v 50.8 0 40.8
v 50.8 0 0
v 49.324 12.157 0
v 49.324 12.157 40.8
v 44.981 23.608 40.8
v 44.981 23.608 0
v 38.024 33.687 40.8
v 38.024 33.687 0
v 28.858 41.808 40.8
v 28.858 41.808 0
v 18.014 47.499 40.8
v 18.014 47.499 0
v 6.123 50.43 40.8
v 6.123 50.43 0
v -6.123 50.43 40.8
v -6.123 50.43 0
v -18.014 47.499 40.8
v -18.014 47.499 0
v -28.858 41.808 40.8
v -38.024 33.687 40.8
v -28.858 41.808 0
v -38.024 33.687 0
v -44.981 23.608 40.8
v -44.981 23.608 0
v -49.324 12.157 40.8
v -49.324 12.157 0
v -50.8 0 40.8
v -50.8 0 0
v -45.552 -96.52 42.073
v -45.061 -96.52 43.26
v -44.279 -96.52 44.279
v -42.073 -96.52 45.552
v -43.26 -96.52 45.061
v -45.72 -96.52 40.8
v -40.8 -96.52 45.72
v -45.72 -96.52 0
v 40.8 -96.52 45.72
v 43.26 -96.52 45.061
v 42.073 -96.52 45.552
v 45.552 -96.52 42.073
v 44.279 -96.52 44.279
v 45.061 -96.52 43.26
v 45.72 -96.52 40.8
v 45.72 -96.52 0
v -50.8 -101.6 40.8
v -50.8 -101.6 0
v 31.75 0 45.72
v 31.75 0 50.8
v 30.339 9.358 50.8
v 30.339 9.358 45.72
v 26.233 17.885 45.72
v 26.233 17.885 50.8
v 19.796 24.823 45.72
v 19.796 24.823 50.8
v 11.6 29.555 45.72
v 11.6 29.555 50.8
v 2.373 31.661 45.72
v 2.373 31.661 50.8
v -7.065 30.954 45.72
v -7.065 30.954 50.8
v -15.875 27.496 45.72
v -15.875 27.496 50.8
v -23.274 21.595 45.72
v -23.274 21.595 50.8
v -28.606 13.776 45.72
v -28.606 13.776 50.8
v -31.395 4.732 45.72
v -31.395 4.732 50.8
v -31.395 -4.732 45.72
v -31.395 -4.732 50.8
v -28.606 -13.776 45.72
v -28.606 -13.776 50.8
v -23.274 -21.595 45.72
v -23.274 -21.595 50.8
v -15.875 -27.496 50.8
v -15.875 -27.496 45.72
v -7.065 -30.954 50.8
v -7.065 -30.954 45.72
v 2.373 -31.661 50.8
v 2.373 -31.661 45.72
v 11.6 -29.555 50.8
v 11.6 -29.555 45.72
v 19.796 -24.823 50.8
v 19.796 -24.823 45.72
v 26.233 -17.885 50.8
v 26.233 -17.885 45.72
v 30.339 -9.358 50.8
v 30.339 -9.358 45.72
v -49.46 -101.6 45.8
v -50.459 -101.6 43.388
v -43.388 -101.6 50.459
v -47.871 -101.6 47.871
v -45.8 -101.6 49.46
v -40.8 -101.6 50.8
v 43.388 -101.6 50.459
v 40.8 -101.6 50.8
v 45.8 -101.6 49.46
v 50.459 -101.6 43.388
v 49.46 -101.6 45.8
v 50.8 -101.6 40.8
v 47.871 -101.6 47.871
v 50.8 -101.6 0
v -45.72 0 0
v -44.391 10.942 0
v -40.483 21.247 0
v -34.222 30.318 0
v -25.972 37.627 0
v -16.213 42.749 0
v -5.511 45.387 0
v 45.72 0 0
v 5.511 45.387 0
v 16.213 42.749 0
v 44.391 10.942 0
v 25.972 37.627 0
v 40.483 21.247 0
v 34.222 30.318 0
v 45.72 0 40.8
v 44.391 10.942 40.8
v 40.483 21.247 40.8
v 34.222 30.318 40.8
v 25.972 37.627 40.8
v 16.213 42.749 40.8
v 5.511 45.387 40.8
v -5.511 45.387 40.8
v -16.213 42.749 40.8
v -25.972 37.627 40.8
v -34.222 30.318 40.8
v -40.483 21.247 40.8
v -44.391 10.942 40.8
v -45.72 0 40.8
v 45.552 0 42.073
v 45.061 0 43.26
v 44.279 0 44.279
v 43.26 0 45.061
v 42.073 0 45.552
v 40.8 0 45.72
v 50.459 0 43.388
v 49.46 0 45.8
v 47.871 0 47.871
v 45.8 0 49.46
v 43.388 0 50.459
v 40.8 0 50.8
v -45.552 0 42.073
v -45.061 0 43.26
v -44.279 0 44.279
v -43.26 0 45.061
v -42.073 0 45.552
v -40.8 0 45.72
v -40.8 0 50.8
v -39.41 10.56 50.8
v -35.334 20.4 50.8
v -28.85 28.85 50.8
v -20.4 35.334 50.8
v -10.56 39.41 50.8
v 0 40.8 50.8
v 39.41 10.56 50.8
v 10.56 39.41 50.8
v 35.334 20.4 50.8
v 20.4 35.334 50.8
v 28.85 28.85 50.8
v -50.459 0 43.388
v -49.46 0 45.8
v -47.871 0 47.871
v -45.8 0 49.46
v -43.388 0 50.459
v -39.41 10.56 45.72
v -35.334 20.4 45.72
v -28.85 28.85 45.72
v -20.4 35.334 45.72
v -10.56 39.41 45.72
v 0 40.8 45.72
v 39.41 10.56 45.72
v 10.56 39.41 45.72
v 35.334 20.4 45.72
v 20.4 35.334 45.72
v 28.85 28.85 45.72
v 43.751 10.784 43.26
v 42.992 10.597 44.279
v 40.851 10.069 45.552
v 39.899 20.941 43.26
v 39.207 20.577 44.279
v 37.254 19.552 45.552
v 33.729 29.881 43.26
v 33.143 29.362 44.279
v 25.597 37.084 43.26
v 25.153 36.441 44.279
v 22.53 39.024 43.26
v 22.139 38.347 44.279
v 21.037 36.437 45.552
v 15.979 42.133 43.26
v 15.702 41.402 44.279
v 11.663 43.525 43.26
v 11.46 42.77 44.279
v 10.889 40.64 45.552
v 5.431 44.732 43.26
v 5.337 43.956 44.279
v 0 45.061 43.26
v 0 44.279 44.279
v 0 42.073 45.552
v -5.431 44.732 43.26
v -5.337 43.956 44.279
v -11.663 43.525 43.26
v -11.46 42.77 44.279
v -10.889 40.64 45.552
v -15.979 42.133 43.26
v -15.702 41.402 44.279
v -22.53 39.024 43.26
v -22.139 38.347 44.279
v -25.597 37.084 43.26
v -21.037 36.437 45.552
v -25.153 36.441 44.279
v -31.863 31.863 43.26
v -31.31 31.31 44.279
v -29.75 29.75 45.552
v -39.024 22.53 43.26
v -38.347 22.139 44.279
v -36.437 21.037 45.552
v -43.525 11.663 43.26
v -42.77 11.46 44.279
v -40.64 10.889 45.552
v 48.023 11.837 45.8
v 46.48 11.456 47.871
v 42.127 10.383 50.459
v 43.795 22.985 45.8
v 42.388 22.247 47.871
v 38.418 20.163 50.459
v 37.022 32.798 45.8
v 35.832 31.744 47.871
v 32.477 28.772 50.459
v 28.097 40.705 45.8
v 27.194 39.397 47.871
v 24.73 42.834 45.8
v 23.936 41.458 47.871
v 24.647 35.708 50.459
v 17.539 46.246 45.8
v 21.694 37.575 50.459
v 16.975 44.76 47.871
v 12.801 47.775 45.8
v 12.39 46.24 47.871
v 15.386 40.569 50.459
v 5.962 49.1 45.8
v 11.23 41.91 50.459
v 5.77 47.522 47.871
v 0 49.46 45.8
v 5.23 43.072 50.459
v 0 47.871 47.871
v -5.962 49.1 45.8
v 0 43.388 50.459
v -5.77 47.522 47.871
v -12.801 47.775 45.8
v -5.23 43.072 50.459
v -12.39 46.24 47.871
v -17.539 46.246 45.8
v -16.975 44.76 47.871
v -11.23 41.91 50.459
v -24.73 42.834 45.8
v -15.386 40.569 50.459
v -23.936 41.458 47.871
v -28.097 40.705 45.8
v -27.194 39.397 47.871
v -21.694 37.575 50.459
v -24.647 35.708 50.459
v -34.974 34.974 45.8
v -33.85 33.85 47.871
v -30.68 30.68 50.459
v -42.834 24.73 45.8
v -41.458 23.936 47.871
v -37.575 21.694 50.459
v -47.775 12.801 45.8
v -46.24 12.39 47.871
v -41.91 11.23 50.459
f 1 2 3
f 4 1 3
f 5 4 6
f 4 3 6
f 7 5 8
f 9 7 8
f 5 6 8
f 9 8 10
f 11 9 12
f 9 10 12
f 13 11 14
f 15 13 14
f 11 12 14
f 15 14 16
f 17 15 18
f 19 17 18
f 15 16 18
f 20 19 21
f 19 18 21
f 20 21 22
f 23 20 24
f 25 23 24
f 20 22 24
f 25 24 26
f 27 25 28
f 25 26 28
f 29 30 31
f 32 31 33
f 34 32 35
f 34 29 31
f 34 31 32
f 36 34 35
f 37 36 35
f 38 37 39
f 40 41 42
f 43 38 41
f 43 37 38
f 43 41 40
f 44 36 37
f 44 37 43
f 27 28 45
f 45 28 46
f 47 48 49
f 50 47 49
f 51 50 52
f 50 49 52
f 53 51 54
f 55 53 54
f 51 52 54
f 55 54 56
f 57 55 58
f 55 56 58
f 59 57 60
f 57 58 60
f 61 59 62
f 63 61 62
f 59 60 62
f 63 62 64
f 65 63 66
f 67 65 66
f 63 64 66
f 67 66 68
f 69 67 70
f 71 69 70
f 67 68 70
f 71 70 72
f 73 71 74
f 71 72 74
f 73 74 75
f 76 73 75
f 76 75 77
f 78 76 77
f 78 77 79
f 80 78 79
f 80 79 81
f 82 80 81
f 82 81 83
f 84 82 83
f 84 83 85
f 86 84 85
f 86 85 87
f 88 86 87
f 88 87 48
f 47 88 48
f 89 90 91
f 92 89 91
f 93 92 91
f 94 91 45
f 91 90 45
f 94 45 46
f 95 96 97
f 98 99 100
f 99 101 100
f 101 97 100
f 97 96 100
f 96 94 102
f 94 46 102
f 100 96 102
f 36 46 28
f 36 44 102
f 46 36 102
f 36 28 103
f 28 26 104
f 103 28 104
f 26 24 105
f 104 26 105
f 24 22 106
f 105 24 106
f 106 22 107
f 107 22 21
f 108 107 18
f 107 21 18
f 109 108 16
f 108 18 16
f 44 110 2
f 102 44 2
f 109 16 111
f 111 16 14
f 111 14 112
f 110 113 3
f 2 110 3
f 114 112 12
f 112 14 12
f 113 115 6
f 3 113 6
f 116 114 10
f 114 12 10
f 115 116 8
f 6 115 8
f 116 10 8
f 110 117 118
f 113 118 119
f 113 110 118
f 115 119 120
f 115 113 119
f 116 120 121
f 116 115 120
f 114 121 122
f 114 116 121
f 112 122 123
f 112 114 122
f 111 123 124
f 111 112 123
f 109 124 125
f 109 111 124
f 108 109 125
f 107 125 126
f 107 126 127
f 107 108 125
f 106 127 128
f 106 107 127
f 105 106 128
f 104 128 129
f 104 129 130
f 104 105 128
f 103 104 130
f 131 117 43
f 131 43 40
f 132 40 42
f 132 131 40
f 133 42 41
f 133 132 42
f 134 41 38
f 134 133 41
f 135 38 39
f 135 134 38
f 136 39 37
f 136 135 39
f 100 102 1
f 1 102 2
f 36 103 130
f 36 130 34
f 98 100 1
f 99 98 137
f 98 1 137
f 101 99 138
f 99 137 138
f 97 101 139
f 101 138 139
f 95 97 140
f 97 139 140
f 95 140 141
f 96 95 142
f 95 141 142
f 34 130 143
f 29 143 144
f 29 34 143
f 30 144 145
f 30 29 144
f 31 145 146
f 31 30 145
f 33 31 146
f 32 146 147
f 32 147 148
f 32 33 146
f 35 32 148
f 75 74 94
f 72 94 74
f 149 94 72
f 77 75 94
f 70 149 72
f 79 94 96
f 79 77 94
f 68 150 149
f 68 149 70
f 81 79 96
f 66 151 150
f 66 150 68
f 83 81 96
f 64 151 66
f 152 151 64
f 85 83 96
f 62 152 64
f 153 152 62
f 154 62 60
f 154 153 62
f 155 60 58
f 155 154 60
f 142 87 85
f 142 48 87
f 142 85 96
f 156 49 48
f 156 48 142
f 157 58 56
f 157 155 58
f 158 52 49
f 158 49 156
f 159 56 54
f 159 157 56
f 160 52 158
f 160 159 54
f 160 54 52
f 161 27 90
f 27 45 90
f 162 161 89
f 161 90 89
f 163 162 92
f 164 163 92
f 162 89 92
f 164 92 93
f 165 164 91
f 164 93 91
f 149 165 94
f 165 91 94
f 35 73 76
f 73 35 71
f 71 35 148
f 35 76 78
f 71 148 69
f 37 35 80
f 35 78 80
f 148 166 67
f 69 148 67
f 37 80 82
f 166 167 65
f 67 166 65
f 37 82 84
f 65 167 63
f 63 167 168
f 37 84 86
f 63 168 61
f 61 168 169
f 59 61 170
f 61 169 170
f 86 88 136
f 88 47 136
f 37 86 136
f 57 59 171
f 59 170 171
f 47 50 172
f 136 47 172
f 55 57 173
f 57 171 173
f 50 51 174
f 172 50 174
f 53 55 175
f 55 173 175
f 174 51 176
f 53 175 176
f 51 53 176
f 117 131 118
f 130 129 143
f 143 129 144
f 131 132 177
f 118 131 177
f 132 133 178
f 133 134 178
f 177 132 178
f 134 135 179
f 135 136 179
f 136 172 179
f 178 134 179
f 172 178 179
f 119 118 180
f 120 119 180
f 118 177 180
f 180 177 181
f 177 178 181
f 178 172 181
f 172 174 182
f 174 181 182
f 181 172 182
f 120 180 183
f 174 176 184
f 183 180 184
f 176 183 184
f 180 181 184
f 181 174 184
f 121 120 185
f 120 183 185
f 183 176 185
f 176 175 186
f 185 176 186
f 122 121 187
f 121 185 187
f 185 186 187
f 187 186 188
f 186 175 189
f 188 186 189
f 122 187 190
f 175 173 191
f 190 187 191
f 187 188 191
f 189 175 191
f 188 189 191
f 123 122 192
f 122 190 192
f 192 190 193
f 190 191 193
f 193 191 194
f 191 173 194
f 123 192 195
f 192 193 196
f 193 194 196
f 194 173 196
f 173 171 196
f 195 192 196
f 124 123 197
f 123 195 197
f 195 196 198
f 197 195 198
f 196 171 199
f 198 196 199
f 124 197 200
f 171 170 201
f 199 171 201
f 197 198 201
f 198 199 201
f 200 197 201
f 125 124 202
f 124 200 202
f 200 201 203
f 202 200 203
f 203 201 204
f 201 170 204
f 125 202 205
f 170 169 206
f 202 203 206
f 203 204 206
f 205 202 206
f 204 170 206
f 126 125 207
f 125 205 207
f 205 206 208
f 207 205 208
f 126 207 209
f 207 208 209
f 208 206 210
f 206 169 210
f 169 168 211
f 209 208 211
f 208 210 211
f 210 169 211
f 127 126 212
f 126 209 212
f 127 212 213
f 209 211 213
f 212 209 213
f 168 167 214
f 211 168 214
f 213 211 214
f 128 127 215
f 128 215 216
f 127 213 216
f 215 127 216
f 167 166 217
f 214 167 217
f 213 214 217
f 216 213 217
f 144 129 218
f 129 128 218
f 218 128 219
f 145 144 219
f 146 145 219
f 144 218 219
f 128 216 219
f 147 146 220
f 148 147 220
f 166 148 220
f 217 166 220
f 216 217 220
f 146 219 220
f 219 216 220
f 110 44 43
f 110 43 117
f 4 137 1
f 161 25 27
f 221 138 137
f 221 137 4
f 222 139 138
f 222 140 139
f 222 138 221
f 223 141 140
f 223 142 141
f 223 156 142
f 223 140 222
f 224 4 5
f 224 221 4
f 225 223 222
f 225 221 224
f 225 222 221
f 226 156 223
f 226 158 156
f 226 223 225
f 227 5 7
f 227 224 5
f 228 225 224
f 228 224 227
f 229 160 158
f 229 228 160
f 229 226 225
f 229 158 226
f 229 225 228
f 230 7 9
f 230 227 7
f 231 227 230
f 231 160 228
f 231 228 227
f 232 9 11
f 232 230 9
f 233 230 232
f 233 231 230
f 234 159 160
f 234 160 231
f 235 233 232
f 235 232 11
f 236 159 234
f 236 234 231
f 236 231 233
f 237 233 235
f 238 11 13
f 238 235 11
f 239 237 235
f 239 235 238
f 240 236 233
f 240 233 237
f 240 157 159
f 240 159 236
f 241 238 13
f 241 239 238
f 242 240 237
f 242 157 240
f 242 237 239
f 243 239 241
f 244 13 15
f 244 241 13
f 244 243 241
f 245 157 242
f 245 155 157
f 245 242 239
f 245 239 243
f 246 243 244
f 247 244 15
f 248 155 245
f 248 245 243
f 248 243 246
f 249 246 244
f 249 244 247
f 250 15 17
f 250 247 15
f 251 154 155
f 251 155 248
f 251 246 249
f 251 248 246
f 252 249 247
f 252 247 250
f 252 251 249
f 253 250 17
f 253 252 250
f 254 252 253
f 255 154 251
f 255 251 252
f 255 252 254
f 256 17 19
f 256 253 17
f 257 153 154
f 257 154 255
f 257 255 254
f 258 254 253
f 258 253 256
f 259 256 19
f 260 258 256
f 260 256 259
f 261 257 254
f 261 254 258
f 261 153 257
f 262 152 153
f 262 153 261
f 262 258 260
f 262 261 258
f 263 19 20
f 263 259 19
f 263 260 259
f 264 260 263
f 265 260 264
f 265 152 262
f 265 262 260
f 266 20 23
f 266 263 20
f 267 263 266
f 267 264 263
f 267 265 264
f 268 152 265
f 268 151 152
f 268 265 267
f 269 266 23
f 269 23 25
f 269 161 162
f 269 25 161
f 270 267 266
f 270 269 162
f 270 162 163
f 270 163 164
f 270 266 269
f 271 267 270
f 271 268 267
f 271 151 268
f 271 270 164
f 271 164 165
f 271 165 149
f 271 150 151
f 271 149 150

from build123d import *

# Parameters (mm, degrees)
BOSS_EXTRUDE1_DEPTH = 50.8
FILLET1_R           = 10
SHELL1_T            = -5.08
SKETCH3_R           = 31.75
CUT_EXTRUDE2_DEPTH  = 125.434078933


with BuildPart() as part:
    # Sketch2 → Boss-Extrude1 (new body)
    with BuildSketch(Plane.XY):
        with BuildLine():
            Line((-50.8, 0), (-50.8, -101.6))
            Line((-50.8, -101.6), (50.8, -101.6))
            Line((50.8, -101.6), (50.8, 0))
            ThreePointArc((50.8, 0), (0, 50.8), (-50.8, 0))
        make_face()
    extrude(amount=BOSS_EXTRUDE1_DEPTH)

    # Fillet1
    fillet1_edges = [part.edges().sort_by_distance(p)[0] for p in [
        (50.8, -50.8, 50.8),
        (0, 50.8, 50.8),
        (-50.8, -50.8, 50.8),
    ]]
    fillet(fillet1_edges, radius=FILLET1_R)

    # Shell1
    shell1_openings = [part.faces().sort_by_distance(p)[0] for p in [
        (0, -30.396611795, 0),
    ]]
    offset(amount=SHELL1_T, openings=shell1_openings, kind=Kind.INTERSECTION)

    # Sketch3 → Cut-Extrude2 (cut, through all)
    with BuildSketch(Plane.XY.offset(50.8)):
        Circle(SKETCH3_R)
    extrude(amount=-CUT_EXTRUDE2_DEPTH, mode=Mode.SUBTRACT)


solid = part.part
